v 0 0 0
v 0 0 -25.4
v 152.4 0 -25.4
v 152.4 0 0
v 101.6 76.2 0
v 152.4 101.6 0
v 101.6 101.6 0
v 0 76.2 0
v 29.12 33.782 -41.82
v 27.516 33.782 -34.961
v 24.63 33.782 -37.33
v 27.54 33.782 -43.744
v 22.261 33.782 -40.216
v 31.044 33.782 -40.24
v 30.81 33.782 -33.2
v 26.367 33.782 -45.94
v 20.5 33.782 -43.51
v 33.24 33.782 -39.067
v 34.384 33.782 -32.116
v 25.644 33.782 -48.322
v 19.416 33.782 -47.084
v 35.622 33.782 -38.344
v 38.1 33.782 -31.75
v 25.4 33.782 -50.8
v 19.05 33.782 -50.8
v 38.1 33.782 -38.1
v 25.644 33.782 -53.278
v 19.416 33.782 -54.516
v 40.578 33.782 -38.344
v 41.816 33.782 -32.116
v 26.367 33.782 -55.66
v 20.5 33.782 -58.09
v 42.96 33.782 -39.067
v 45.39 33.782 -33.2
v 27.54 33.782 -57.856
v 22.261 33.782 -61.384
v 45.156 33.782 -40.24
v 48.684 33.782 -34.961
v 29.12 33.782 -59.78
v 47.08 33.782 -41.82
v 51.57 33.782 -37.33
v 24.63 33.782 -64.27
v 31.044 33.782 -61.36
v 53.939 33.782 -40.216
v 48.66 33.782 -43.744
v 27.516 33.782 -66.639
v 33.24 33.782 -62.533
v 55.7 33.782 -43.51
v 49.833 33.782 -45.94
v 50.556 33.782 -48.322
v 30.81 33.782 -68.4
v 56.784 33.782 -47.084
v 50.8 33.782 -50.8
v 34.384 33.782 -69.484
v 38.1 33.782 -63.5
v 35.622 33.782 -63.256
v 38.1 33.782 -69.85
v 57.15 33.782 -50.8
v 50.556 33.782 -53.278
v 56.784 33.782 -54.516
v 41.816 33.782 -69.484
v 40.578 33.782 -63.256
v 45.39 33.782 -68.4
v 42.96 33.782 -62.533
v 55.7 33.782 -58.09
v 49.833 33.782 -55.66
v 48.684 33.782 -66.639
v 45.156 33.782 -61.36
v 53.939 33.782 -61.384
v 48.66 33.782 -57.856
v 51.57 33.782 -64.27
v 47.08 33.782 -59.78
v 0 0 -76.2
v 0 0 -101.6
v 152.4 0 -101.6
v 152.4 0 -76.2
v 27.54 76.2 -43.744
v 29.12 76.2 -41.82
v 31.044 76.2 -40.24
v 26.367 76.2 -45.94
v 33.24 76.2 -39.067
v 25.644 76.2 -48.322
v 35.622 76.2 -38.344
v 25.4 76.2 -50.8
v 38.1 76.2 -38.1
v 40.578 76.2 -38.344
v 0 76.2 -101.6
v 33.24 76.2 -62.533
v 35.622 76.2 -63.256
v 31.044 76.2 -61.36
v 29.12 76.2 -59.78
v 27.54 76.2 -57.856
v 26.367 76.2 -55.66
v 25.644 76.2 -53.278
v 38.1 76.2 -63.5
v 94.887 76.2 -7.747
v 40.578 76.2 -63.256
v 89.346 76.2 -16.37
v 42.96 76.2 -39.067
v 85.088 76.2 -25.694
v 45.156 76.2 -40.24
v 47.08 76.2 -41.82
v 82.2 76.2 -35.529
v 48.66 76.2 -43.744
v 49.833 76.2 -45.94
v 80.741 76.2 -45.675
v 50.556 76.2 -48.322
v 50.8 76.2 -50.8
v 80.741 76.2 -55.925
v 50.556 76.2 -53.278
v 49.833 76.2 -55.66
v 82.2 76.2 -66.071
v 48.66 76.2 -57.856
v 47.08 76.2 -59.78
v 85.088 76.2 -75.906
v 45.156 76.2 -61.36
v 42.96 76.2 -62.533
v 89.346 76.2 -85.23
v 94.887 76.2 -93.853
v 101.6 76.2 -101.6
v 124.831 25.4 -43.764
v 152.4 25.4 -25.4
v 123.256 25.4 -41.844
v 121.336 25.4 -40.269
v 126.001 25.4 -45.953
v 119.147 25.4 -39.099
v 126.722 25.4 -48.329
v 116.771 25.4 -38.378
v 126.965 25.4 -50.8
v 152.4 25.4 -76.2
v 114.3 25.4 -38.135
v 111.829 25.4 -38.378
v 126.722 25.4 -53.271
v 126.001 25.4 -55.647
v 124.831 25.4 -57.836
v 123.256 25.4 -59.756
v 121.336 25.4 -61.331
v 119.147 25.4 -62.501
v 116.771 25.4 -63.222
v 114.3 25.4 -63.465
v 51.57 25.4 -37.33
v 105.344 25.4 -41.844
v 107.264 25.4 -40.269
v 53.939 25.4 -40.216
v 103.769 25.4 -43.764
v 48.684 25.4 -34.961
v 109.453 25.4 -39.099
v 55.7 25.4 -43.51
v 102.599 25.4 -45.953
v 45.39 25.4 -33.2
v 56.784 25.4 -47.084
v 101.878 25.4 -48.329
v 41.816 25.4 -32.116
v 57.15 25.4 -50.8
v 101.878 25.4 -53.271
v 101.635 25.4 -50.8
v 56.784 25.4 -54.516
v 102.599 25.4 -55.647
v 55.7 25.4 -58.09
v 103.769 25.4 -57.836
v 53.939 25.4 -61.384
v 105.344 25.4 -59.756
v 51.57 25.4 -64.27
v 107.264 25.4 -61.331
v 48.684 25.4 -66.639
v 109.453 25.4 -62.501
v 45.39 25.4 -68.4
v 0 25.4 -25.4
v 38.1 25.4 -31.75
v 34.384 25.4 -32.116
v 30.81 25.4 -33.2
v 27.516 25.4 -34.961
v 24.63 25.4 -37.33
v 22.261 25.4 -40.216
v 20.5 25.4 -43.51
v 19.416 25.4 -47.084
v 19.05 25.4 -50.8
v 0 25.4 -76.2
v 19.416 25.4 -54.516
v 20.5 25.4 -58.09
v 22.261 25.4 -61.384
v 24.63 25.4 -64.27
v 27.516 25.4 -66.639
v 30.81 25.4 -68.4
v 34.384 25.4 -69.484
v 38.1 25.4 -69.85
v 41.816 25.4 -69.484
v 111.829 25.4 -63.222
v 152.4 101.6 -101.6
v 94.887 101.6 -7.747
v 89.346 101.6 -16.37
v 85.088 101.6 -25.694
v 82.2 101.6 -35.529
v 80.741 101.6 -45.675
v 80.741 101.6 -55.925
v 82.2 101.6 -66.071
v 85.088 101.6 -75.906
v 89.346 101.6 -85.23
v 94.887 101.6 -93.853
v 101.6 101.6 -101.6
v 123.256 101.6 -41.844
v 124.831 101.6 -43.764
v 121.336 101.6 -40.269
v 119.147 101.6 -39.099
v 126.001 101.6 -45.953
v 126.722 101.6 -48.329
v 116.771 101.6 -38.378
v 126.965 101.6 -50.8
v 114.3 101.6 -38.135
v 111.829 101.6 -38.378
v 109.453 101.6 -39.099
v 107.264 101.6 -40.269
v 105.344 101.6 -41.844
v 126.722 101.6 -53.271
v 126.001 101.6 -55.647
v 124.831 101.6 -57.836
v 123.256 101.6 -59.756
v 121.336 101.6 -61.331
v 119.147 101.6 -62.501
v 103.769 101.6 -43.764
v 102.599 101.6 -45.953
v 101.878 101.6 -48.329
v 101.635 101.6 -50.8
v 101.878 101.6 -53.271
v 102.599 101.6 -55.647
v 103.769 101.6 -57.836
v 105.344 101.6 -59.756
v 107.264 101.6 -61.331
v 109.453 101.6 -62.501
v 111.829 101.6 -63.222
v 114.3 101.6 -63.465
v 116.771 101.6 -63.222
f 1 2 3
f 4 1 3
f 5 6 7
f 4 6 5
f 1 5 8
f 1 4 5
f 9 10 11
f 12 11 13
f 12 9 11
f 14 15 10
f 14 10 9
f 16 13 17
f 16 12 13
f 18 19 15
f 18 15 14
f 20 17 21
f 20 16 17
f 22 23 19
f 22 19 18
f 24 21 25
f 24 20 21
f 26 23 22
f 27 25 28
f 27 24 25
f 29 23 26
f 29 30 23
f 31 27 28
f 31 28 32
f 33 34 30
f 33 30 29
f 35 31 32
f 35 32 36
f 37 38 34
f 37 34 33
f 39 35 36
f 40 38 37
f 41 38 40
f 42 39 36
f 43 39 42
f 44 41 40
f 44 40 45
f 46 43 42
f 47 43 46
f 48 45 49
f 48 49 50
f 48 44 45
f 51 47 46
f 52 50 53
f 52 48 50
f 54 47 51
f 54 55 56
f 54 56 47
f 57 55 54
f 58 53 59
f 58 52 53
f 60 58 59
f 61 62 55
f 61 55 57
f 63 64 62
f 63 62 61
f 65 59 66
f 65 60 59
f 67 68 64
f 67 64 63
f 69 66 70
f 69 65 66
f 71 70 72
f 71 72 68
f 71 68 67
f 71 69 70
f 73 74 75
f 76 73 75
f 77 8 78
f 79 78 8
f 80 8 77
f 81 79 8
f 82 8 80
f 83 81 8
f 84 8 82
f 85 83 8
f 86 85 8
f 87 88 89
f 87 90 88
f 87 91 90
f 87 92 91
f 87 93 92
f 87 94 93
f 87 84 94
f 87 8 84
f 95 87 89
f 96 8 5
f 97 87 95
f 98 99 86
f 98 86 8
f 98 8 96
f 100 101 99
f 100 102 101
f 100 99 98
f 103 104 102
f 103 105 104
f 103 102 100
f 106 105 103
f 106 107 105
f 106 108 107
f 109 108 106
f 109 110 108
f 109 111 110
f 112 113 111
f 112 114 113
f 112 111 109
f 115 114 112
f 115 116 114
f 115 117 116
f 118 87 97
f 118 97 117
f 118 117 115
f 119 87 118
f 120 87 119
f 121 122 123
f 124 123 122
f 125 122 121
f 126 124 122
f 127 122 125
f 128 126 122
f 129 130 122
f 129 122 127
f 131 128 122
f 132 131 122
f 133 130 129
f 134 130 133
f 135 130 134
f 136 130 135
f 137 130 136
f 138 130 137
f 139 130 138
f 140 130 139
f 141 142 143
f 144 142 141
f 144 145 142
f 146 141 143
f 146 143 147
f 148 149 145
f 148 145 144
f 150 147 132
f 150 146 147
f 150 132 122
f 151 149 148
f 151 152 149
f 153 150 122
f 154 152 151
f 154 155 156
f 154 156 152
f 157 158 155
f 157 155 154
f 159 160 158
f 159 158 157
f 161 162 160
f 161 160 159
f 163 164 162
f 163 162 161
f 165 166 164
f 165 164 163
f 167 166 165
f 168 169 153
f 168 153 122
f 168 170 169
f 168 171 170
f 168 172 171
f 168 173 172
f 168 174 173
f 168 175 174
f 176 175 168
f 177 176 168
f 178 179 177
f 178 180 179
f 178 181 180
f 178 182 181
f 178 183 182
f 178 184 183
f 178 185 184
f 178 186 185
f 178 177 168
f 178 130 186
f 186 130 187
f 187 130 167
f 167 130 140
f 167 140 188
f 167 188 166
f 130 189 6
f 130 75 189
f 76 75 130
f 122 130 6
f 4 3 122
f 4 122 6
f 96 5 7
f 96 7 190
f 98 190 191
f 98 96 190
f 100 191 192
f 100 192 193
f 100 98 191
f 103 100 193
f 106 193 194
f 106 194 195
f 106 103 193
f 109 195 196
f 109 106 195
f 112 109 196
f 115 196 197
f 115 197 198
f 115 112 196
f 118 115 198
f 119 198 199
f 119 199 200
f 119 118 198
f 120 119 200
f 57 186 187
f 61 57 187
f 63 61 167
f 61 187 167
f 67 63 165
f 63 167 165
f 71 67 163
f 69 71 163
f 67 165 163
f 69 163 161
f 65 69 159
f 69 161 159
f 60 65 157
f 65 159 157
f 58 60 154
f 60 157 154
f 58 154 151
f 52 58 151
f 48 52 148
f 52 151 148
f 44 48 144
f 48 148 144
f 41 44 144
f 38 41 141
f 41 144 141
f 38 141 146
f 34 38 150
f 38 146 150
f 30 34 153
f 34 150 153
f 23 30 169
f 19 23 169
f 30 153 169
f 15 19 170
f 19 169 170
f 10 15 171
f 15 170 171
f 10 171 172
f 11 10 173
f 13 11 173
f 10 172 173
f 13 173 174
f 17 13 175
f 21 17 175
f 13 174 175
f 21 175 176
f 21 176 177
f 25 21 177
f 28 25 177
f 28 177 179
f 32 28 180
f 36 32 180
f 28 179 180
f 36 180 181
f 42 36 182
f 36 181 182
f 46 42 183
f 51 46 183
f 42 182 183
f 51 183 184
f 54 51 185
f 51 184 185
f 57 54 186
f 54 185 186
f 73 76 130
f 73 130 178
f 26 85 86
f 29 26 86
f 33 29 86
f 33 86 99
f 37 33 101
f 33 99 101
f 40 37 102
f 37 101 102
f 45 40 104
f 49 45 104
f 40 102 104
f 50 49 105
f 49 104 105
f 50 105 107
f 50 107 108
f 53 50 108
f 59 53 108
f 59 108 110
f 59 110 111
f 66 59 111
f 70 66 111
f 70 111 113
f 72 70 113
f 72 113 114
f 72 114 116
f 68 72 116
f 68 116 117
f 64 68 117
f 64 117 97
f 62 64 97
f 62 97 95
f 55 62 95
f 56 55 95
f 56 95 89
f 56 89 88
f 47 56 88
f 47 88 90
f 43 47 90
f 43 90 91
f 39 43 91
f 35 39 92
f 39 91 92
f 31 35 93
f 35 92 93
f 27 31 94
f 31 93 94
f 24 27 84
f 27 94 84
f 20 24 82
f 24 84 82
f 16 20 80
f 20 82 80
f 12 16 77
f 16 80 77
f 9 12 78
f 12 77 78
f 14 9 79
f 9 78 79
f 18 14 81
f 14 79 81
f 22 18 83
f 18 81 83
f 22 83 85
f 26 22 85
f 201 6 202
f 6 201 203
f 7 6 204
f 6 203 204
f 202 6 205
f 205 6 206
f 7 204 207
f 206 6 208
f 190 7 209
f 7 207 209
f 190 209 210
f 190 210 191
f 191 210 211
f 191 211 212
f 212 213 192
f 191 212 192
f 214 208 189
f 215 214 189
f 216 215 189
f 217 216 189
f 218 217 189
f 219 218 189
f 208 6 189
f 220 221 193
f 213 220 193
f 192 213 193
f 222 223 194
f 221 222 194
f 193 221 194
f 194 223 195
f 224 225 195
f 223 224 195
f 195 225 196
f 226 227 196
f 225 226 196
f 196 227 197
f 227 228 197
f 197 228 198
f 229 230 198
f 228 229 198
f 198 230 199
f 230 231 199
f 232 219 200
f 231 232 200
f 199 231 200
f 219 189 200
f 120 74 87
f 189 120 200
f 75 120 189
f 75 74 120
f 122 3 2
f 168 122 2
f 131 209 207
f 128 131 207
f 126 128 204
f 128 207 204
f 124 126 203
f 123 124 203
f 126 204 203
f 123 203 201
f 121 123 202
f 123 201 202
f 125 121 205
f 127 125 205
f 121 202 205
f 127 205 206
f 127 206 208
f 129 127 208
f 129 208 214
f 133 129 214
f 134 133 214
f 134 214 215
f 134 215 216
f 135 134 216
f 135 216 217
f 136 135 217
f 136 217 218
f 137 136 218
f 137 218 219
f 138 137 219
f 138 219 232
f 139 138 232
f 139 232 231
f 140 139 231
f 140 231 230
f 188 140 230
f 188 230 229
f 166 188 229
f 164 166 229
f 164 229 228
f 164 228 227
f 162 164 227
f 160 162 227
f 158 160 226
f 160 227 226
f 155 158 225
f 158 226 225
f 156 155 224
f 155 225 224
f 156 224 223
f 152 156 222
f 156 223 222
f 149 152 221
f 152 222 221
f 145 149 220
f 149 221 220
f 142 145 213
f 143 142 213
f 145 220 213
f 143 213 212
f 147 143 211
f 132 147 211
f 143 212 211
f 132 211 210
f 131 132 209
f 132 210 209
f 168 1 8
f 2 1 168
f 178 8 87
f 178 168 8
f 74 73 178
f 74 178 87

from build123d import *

# Parameters (mm, degrees)
SKETCH1_W           = 152.4
SKETCH1_H           = 101.6
BOSS_EXTRUDE1_DEPTH = 101.6
SKETCH2_W           = 152.4
SKETCH2_H           = 50.8
CUT_EXTRUDE1_DEPTH  = 25.4
SKETCH3_W           = 76.2
SKETCH3_H           = 101.6
CUT_EXTRUDE2_DEPTH  = 25.4
SKETCH4_W           = 76.2
SKETCH4_H           = 101.6
CUT_EXTRUDE3_DEPTH  = 25.4
BOSS_EXTRUDE2_DEPTH = 25.4
SKETCH6_R           = 12.665162167
CUT_EXTRUDE6_DEPTH  = 101.6
SKETCH7_R           = 12.7
CUT_EXTRUDE7_DEPTH  = 50.8
SKETCH8_R           = 19.05
CUT_EXTRUDE8_DEPTH  = 8.382


with BuildPart() as part:
    # Sketch1 → Boss-Extrude1 (new body)
    with BuildSketch(Plane(origin=(0, 0, 0), x_dir=(1, 0, 0), z_dir=(0, 1, 0))):
        with Locations((76.2, 50.8)):
            Rectangle(SKETCH1_W, SKETCH1_H)
    extrude(amount=BOSS_EXTRUDE1_DEPTH)

    # Sketch2 → Cut-Extrude1 (cut)
    with BuildSketch(Plane(origin=(0, 0, 0), x_dir=(-1, 0, 0), z_dir=(0, -1, 0))):
        with Locations((-76.2, 50.8)):
            Rectangle(SKETCH2_W, SKETCH2_H)
    extrude(amount=-CUT_EXTRUDE1_DEPTH, mode=Mode.SUBTRACT)

    # Sketch3 → Cut-Extrude2 (cut)
    with BuildSketch(Plane(origin=(0, 101.6, 0), x_dir=(1, 0, 0), z_dir=(0, 1, 0))):
        with Locations((38.1, 50.8)):
            Rectangle(SKETCH3_W, SKETCH3_H)
    extrude(amount=-CUT_EXTRUDE2_DEPTH, mode=Mode.SUBTRACT)

    # Sketch4 → Cut-Extrude3 (cut)
    with BuildSketch(Plane(origin=(0, 101.6, 0), x_dir=(1, 0, 0), z_dir=(0, 1, 0))):
        with Locations((114.3, 50.8)):
            Rectangle(SKETCH4_W, SKETCH4_H)
    extrude(amount=-CUT_EXTRUDE3_DEPTH, mode=Mode.SUBTRACT)

    # Sketch5 → Boss-Extrude2 (add)
    with BuildSketch(Plane(origin=(0, 76.2, 0), x_dir=(1, 0, 0), z_dir=(0, 1, 0))):
        with BuildLine():
            Line((152.4, 0), (101.6, 0))
            ThreePointArc((101.6, 0), (80.557951031, 50.8), (101.6, 101.6))
            Line((101.6, 101.6), (152.4, 101.6))
            Line((152.4, 101.6), (152.4, 0))
        make_face()
    extrude(amount=BOSS_EXTRUDE2_DEPTH)

    # Sketch6 → Cut-Extrude6 (cut)
    with BuildSketch(Plane(origin=(0, 101.6, 0), x_dir=(1, 0, 0), z_dir=(0, 1, 0))):
        with Locations(Location((114.3, 50.8, 0), (0, 0, 270))):
            Circle(SKETCH6_R)
    extrude(amount=-CUT_EXTRUDE6_DEPTH, mode=Mode.SUBTRACT)

    # Sketch7 → Cut-Extrude7 (cut)
    with BuildSketch(Plane(origin=(0, 76.2, 0), x_dir=(1, 0, 0), z_dir=(0, 1, 0))):
        with Locations(Location((38.1, 50.8, 0), (0, 0, 270))):
            Circle(SKETCH7_R)
    extrude(amount=-CUT_EXTRUDE7_DEPTH, mode=Mode.SUBTRACT)

    # Sketch8 → Cut-Extrude8 (cut)
    with BuildSketch(Plane.XZ.offset(-25.4)):
        with Locations(Location((38.1, -50.8, 0), (0, 0, 270))):
            Circle(SKETCH8_R)
    extrude(amount=-CUT_EXTRUDE8_DEPTH, mode=Mode.SUBTRACT)


solid = part.part
